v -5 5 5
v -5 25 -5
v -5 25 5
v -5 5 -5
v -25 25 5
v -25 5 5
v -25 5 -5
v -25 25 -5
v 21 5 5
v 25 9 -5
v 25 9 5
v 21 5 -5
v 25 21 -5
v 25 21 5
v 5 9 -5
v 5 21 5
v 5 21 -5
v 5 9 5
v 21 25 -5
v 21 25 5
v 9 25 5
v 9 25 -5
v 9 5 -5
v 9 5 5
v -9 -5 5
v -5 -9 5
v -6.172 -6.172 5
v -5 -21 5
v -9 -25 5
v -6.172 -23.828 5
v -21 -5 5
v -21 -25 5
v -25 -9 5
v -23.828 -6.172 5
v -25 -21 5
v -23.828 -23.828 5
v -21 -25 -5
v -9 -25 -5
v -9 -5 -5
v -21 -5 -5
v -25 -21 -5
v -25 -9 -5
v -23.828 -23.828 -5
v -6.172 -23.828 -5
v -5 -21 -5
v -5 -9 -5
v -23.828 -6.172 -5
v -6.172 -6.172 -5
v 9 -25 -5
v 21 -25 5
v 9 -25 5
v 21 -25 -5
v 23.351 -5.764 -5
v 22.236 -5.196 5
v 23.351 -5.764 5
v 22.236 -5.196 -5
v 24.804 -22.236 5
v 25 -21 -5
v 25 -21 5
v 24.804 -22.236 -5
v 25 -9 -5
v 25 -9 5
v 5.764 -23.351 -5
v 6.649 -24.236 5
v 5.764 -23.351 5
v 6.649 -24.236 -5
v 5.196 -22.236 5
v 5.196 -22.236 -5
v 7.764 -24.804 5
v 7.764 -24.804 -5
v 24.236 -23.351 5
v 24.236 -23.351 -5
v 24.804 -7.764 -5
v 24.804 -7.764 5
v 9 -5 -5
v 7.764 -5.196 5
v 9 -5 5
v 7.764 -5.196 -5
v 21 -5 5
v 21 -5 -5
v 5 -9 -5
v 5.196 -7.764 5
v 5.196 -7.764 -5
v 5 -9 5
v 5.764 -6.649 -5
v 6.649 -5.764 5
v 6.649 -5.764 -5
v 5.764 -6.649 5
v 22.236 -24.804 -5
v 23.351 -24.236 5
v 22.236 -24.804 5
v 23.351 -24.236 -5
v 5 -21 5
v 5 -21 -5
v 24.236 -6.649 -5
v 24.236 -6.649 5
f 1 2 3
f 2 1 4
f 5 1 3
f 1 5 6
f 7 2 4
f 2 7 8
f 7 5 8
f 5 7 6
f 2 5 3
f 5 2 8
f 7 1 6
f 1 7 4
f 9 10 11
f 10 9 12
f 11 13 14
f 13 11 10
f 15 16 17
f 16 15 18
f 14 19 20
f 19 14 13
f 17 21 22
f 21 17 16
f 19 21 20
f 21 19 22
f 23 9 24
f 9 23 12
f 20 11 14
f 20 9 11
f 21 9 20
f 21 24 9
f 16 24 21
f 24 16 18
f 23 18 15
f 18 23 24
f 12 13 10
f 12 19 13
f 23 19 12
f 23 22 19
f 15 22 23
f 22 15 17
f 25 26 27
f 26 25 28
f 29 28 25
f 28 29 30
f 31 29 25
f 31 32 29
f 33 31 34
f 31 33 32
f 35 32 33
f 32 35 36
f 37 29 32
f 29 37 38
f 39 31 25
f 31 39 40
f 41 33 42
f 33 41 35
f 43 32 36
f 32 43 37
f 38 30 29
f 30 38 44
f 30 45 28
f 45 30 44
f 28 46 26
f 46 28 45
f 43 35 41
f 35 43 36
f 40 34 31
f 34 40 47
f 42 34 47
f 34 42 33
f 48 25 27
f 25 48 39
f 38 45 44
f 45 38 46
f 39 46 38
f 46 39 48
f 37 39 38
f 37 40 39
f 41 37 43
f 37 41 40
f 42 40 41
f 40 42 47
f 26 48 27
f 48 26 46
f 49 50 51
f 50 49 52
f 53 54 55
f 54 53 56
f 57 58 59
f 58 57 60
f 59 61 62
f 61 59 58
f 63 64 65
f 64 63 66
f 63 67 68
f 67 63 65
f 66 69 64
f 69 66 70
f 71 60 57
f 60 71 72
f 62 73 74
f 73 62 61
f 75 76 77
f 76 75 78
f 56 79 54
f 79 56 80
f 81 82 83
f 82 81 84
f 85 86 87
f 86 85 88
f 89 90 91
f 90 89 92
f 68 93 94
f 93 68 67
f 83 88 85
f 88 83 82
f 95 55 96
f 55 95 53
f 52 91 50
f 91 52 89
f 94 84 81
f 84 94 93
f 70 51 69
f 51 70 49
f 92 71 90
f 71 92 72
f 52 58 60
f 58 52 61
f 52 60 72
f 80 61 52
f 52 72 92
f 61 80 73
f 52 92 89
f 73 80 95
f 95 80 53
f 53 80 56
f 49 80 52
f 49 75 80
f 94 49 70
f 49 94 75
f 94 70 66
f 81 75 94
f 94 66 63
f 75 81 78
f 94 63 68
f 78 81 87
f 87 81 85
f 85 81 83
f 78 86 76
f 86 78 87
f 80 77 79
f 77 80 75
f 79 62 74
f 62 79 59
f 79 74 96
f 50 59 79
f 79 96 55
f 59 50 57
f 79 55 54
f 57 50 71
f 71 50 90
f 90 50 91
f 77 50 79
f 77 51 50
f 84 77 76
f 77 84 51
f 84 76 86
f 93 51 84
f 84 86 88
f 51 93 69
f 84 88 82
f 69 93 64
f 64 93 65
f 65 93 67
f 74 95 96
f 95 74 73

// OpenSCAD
//------------------------------------------------------------------------------
//  Bevel edge cube.
//  (c) Juan Gonzalez-Gomez (Obijuan), Sep-2012
//------------------------------------------------------------------------------

//----------------- IMPLEMENTATION USING THE MINKOWSKI OPERATOR ----------------

//------------------------------------------------------------------------------
//-- Bevel Cube main function
//-- Parameters:
//--   * Size:  Cube size
//--   * cr : Corner radius (if cr==0, a standar cube is built)
//--   * cres:  Corner resolution (in points). cres=0 means flat corners
//------------------------------------------------------------------------------
module bcube(size,cr=0,cres=0)
{
  //-- Internal cube size
  bsize = size - 2*[cr,cr,0];

  //-- Get the (x,y) coorner coordinates in the 1st cuadrant
  x = bsize[0]/2;
  y = bsize[1]/2;

  //-- A corner radius of 0 means a standar cube!
  if (cr==0)
    cube(bsize,center=true);
  else {

      
      //-- The height of minkowski object is double. So
      //-- we sould scale by 0.5
      scale([1,1,0.5])

      //-- This translation is for centering the minkowski objet
      translate([-x, -y,0])

      //-- Built the  beveled cube with minkowski
      minkowski() {

        //-- Internal cube
        cube(bsize,center=true);

        //-- Cylinder in the corner (1st cuadrant)
        translate([x,y, 0])
          cylinder(r=cr, h=bsize[2],center=true, $fn=4*(cres+1));
      }
  }

}


//-- Examples of use of the bcube() module

//-- Standar cube
translate([-15,15,0])
bcube([20,20,10]);

//-- Beveled cube (0 point resolution)
translate([15,15,0])
  bcube([20,20,10],cr=4);

//-- Beveled cube (1 point resolution)
translate([-15,-15,0])
  bcube([20,20,10],cr=4, cres=1);

//-- Beveled cube (4 points resolution)
translate([15,-15,0])
  bcube([20,20,10],cr=4, cres=4);
